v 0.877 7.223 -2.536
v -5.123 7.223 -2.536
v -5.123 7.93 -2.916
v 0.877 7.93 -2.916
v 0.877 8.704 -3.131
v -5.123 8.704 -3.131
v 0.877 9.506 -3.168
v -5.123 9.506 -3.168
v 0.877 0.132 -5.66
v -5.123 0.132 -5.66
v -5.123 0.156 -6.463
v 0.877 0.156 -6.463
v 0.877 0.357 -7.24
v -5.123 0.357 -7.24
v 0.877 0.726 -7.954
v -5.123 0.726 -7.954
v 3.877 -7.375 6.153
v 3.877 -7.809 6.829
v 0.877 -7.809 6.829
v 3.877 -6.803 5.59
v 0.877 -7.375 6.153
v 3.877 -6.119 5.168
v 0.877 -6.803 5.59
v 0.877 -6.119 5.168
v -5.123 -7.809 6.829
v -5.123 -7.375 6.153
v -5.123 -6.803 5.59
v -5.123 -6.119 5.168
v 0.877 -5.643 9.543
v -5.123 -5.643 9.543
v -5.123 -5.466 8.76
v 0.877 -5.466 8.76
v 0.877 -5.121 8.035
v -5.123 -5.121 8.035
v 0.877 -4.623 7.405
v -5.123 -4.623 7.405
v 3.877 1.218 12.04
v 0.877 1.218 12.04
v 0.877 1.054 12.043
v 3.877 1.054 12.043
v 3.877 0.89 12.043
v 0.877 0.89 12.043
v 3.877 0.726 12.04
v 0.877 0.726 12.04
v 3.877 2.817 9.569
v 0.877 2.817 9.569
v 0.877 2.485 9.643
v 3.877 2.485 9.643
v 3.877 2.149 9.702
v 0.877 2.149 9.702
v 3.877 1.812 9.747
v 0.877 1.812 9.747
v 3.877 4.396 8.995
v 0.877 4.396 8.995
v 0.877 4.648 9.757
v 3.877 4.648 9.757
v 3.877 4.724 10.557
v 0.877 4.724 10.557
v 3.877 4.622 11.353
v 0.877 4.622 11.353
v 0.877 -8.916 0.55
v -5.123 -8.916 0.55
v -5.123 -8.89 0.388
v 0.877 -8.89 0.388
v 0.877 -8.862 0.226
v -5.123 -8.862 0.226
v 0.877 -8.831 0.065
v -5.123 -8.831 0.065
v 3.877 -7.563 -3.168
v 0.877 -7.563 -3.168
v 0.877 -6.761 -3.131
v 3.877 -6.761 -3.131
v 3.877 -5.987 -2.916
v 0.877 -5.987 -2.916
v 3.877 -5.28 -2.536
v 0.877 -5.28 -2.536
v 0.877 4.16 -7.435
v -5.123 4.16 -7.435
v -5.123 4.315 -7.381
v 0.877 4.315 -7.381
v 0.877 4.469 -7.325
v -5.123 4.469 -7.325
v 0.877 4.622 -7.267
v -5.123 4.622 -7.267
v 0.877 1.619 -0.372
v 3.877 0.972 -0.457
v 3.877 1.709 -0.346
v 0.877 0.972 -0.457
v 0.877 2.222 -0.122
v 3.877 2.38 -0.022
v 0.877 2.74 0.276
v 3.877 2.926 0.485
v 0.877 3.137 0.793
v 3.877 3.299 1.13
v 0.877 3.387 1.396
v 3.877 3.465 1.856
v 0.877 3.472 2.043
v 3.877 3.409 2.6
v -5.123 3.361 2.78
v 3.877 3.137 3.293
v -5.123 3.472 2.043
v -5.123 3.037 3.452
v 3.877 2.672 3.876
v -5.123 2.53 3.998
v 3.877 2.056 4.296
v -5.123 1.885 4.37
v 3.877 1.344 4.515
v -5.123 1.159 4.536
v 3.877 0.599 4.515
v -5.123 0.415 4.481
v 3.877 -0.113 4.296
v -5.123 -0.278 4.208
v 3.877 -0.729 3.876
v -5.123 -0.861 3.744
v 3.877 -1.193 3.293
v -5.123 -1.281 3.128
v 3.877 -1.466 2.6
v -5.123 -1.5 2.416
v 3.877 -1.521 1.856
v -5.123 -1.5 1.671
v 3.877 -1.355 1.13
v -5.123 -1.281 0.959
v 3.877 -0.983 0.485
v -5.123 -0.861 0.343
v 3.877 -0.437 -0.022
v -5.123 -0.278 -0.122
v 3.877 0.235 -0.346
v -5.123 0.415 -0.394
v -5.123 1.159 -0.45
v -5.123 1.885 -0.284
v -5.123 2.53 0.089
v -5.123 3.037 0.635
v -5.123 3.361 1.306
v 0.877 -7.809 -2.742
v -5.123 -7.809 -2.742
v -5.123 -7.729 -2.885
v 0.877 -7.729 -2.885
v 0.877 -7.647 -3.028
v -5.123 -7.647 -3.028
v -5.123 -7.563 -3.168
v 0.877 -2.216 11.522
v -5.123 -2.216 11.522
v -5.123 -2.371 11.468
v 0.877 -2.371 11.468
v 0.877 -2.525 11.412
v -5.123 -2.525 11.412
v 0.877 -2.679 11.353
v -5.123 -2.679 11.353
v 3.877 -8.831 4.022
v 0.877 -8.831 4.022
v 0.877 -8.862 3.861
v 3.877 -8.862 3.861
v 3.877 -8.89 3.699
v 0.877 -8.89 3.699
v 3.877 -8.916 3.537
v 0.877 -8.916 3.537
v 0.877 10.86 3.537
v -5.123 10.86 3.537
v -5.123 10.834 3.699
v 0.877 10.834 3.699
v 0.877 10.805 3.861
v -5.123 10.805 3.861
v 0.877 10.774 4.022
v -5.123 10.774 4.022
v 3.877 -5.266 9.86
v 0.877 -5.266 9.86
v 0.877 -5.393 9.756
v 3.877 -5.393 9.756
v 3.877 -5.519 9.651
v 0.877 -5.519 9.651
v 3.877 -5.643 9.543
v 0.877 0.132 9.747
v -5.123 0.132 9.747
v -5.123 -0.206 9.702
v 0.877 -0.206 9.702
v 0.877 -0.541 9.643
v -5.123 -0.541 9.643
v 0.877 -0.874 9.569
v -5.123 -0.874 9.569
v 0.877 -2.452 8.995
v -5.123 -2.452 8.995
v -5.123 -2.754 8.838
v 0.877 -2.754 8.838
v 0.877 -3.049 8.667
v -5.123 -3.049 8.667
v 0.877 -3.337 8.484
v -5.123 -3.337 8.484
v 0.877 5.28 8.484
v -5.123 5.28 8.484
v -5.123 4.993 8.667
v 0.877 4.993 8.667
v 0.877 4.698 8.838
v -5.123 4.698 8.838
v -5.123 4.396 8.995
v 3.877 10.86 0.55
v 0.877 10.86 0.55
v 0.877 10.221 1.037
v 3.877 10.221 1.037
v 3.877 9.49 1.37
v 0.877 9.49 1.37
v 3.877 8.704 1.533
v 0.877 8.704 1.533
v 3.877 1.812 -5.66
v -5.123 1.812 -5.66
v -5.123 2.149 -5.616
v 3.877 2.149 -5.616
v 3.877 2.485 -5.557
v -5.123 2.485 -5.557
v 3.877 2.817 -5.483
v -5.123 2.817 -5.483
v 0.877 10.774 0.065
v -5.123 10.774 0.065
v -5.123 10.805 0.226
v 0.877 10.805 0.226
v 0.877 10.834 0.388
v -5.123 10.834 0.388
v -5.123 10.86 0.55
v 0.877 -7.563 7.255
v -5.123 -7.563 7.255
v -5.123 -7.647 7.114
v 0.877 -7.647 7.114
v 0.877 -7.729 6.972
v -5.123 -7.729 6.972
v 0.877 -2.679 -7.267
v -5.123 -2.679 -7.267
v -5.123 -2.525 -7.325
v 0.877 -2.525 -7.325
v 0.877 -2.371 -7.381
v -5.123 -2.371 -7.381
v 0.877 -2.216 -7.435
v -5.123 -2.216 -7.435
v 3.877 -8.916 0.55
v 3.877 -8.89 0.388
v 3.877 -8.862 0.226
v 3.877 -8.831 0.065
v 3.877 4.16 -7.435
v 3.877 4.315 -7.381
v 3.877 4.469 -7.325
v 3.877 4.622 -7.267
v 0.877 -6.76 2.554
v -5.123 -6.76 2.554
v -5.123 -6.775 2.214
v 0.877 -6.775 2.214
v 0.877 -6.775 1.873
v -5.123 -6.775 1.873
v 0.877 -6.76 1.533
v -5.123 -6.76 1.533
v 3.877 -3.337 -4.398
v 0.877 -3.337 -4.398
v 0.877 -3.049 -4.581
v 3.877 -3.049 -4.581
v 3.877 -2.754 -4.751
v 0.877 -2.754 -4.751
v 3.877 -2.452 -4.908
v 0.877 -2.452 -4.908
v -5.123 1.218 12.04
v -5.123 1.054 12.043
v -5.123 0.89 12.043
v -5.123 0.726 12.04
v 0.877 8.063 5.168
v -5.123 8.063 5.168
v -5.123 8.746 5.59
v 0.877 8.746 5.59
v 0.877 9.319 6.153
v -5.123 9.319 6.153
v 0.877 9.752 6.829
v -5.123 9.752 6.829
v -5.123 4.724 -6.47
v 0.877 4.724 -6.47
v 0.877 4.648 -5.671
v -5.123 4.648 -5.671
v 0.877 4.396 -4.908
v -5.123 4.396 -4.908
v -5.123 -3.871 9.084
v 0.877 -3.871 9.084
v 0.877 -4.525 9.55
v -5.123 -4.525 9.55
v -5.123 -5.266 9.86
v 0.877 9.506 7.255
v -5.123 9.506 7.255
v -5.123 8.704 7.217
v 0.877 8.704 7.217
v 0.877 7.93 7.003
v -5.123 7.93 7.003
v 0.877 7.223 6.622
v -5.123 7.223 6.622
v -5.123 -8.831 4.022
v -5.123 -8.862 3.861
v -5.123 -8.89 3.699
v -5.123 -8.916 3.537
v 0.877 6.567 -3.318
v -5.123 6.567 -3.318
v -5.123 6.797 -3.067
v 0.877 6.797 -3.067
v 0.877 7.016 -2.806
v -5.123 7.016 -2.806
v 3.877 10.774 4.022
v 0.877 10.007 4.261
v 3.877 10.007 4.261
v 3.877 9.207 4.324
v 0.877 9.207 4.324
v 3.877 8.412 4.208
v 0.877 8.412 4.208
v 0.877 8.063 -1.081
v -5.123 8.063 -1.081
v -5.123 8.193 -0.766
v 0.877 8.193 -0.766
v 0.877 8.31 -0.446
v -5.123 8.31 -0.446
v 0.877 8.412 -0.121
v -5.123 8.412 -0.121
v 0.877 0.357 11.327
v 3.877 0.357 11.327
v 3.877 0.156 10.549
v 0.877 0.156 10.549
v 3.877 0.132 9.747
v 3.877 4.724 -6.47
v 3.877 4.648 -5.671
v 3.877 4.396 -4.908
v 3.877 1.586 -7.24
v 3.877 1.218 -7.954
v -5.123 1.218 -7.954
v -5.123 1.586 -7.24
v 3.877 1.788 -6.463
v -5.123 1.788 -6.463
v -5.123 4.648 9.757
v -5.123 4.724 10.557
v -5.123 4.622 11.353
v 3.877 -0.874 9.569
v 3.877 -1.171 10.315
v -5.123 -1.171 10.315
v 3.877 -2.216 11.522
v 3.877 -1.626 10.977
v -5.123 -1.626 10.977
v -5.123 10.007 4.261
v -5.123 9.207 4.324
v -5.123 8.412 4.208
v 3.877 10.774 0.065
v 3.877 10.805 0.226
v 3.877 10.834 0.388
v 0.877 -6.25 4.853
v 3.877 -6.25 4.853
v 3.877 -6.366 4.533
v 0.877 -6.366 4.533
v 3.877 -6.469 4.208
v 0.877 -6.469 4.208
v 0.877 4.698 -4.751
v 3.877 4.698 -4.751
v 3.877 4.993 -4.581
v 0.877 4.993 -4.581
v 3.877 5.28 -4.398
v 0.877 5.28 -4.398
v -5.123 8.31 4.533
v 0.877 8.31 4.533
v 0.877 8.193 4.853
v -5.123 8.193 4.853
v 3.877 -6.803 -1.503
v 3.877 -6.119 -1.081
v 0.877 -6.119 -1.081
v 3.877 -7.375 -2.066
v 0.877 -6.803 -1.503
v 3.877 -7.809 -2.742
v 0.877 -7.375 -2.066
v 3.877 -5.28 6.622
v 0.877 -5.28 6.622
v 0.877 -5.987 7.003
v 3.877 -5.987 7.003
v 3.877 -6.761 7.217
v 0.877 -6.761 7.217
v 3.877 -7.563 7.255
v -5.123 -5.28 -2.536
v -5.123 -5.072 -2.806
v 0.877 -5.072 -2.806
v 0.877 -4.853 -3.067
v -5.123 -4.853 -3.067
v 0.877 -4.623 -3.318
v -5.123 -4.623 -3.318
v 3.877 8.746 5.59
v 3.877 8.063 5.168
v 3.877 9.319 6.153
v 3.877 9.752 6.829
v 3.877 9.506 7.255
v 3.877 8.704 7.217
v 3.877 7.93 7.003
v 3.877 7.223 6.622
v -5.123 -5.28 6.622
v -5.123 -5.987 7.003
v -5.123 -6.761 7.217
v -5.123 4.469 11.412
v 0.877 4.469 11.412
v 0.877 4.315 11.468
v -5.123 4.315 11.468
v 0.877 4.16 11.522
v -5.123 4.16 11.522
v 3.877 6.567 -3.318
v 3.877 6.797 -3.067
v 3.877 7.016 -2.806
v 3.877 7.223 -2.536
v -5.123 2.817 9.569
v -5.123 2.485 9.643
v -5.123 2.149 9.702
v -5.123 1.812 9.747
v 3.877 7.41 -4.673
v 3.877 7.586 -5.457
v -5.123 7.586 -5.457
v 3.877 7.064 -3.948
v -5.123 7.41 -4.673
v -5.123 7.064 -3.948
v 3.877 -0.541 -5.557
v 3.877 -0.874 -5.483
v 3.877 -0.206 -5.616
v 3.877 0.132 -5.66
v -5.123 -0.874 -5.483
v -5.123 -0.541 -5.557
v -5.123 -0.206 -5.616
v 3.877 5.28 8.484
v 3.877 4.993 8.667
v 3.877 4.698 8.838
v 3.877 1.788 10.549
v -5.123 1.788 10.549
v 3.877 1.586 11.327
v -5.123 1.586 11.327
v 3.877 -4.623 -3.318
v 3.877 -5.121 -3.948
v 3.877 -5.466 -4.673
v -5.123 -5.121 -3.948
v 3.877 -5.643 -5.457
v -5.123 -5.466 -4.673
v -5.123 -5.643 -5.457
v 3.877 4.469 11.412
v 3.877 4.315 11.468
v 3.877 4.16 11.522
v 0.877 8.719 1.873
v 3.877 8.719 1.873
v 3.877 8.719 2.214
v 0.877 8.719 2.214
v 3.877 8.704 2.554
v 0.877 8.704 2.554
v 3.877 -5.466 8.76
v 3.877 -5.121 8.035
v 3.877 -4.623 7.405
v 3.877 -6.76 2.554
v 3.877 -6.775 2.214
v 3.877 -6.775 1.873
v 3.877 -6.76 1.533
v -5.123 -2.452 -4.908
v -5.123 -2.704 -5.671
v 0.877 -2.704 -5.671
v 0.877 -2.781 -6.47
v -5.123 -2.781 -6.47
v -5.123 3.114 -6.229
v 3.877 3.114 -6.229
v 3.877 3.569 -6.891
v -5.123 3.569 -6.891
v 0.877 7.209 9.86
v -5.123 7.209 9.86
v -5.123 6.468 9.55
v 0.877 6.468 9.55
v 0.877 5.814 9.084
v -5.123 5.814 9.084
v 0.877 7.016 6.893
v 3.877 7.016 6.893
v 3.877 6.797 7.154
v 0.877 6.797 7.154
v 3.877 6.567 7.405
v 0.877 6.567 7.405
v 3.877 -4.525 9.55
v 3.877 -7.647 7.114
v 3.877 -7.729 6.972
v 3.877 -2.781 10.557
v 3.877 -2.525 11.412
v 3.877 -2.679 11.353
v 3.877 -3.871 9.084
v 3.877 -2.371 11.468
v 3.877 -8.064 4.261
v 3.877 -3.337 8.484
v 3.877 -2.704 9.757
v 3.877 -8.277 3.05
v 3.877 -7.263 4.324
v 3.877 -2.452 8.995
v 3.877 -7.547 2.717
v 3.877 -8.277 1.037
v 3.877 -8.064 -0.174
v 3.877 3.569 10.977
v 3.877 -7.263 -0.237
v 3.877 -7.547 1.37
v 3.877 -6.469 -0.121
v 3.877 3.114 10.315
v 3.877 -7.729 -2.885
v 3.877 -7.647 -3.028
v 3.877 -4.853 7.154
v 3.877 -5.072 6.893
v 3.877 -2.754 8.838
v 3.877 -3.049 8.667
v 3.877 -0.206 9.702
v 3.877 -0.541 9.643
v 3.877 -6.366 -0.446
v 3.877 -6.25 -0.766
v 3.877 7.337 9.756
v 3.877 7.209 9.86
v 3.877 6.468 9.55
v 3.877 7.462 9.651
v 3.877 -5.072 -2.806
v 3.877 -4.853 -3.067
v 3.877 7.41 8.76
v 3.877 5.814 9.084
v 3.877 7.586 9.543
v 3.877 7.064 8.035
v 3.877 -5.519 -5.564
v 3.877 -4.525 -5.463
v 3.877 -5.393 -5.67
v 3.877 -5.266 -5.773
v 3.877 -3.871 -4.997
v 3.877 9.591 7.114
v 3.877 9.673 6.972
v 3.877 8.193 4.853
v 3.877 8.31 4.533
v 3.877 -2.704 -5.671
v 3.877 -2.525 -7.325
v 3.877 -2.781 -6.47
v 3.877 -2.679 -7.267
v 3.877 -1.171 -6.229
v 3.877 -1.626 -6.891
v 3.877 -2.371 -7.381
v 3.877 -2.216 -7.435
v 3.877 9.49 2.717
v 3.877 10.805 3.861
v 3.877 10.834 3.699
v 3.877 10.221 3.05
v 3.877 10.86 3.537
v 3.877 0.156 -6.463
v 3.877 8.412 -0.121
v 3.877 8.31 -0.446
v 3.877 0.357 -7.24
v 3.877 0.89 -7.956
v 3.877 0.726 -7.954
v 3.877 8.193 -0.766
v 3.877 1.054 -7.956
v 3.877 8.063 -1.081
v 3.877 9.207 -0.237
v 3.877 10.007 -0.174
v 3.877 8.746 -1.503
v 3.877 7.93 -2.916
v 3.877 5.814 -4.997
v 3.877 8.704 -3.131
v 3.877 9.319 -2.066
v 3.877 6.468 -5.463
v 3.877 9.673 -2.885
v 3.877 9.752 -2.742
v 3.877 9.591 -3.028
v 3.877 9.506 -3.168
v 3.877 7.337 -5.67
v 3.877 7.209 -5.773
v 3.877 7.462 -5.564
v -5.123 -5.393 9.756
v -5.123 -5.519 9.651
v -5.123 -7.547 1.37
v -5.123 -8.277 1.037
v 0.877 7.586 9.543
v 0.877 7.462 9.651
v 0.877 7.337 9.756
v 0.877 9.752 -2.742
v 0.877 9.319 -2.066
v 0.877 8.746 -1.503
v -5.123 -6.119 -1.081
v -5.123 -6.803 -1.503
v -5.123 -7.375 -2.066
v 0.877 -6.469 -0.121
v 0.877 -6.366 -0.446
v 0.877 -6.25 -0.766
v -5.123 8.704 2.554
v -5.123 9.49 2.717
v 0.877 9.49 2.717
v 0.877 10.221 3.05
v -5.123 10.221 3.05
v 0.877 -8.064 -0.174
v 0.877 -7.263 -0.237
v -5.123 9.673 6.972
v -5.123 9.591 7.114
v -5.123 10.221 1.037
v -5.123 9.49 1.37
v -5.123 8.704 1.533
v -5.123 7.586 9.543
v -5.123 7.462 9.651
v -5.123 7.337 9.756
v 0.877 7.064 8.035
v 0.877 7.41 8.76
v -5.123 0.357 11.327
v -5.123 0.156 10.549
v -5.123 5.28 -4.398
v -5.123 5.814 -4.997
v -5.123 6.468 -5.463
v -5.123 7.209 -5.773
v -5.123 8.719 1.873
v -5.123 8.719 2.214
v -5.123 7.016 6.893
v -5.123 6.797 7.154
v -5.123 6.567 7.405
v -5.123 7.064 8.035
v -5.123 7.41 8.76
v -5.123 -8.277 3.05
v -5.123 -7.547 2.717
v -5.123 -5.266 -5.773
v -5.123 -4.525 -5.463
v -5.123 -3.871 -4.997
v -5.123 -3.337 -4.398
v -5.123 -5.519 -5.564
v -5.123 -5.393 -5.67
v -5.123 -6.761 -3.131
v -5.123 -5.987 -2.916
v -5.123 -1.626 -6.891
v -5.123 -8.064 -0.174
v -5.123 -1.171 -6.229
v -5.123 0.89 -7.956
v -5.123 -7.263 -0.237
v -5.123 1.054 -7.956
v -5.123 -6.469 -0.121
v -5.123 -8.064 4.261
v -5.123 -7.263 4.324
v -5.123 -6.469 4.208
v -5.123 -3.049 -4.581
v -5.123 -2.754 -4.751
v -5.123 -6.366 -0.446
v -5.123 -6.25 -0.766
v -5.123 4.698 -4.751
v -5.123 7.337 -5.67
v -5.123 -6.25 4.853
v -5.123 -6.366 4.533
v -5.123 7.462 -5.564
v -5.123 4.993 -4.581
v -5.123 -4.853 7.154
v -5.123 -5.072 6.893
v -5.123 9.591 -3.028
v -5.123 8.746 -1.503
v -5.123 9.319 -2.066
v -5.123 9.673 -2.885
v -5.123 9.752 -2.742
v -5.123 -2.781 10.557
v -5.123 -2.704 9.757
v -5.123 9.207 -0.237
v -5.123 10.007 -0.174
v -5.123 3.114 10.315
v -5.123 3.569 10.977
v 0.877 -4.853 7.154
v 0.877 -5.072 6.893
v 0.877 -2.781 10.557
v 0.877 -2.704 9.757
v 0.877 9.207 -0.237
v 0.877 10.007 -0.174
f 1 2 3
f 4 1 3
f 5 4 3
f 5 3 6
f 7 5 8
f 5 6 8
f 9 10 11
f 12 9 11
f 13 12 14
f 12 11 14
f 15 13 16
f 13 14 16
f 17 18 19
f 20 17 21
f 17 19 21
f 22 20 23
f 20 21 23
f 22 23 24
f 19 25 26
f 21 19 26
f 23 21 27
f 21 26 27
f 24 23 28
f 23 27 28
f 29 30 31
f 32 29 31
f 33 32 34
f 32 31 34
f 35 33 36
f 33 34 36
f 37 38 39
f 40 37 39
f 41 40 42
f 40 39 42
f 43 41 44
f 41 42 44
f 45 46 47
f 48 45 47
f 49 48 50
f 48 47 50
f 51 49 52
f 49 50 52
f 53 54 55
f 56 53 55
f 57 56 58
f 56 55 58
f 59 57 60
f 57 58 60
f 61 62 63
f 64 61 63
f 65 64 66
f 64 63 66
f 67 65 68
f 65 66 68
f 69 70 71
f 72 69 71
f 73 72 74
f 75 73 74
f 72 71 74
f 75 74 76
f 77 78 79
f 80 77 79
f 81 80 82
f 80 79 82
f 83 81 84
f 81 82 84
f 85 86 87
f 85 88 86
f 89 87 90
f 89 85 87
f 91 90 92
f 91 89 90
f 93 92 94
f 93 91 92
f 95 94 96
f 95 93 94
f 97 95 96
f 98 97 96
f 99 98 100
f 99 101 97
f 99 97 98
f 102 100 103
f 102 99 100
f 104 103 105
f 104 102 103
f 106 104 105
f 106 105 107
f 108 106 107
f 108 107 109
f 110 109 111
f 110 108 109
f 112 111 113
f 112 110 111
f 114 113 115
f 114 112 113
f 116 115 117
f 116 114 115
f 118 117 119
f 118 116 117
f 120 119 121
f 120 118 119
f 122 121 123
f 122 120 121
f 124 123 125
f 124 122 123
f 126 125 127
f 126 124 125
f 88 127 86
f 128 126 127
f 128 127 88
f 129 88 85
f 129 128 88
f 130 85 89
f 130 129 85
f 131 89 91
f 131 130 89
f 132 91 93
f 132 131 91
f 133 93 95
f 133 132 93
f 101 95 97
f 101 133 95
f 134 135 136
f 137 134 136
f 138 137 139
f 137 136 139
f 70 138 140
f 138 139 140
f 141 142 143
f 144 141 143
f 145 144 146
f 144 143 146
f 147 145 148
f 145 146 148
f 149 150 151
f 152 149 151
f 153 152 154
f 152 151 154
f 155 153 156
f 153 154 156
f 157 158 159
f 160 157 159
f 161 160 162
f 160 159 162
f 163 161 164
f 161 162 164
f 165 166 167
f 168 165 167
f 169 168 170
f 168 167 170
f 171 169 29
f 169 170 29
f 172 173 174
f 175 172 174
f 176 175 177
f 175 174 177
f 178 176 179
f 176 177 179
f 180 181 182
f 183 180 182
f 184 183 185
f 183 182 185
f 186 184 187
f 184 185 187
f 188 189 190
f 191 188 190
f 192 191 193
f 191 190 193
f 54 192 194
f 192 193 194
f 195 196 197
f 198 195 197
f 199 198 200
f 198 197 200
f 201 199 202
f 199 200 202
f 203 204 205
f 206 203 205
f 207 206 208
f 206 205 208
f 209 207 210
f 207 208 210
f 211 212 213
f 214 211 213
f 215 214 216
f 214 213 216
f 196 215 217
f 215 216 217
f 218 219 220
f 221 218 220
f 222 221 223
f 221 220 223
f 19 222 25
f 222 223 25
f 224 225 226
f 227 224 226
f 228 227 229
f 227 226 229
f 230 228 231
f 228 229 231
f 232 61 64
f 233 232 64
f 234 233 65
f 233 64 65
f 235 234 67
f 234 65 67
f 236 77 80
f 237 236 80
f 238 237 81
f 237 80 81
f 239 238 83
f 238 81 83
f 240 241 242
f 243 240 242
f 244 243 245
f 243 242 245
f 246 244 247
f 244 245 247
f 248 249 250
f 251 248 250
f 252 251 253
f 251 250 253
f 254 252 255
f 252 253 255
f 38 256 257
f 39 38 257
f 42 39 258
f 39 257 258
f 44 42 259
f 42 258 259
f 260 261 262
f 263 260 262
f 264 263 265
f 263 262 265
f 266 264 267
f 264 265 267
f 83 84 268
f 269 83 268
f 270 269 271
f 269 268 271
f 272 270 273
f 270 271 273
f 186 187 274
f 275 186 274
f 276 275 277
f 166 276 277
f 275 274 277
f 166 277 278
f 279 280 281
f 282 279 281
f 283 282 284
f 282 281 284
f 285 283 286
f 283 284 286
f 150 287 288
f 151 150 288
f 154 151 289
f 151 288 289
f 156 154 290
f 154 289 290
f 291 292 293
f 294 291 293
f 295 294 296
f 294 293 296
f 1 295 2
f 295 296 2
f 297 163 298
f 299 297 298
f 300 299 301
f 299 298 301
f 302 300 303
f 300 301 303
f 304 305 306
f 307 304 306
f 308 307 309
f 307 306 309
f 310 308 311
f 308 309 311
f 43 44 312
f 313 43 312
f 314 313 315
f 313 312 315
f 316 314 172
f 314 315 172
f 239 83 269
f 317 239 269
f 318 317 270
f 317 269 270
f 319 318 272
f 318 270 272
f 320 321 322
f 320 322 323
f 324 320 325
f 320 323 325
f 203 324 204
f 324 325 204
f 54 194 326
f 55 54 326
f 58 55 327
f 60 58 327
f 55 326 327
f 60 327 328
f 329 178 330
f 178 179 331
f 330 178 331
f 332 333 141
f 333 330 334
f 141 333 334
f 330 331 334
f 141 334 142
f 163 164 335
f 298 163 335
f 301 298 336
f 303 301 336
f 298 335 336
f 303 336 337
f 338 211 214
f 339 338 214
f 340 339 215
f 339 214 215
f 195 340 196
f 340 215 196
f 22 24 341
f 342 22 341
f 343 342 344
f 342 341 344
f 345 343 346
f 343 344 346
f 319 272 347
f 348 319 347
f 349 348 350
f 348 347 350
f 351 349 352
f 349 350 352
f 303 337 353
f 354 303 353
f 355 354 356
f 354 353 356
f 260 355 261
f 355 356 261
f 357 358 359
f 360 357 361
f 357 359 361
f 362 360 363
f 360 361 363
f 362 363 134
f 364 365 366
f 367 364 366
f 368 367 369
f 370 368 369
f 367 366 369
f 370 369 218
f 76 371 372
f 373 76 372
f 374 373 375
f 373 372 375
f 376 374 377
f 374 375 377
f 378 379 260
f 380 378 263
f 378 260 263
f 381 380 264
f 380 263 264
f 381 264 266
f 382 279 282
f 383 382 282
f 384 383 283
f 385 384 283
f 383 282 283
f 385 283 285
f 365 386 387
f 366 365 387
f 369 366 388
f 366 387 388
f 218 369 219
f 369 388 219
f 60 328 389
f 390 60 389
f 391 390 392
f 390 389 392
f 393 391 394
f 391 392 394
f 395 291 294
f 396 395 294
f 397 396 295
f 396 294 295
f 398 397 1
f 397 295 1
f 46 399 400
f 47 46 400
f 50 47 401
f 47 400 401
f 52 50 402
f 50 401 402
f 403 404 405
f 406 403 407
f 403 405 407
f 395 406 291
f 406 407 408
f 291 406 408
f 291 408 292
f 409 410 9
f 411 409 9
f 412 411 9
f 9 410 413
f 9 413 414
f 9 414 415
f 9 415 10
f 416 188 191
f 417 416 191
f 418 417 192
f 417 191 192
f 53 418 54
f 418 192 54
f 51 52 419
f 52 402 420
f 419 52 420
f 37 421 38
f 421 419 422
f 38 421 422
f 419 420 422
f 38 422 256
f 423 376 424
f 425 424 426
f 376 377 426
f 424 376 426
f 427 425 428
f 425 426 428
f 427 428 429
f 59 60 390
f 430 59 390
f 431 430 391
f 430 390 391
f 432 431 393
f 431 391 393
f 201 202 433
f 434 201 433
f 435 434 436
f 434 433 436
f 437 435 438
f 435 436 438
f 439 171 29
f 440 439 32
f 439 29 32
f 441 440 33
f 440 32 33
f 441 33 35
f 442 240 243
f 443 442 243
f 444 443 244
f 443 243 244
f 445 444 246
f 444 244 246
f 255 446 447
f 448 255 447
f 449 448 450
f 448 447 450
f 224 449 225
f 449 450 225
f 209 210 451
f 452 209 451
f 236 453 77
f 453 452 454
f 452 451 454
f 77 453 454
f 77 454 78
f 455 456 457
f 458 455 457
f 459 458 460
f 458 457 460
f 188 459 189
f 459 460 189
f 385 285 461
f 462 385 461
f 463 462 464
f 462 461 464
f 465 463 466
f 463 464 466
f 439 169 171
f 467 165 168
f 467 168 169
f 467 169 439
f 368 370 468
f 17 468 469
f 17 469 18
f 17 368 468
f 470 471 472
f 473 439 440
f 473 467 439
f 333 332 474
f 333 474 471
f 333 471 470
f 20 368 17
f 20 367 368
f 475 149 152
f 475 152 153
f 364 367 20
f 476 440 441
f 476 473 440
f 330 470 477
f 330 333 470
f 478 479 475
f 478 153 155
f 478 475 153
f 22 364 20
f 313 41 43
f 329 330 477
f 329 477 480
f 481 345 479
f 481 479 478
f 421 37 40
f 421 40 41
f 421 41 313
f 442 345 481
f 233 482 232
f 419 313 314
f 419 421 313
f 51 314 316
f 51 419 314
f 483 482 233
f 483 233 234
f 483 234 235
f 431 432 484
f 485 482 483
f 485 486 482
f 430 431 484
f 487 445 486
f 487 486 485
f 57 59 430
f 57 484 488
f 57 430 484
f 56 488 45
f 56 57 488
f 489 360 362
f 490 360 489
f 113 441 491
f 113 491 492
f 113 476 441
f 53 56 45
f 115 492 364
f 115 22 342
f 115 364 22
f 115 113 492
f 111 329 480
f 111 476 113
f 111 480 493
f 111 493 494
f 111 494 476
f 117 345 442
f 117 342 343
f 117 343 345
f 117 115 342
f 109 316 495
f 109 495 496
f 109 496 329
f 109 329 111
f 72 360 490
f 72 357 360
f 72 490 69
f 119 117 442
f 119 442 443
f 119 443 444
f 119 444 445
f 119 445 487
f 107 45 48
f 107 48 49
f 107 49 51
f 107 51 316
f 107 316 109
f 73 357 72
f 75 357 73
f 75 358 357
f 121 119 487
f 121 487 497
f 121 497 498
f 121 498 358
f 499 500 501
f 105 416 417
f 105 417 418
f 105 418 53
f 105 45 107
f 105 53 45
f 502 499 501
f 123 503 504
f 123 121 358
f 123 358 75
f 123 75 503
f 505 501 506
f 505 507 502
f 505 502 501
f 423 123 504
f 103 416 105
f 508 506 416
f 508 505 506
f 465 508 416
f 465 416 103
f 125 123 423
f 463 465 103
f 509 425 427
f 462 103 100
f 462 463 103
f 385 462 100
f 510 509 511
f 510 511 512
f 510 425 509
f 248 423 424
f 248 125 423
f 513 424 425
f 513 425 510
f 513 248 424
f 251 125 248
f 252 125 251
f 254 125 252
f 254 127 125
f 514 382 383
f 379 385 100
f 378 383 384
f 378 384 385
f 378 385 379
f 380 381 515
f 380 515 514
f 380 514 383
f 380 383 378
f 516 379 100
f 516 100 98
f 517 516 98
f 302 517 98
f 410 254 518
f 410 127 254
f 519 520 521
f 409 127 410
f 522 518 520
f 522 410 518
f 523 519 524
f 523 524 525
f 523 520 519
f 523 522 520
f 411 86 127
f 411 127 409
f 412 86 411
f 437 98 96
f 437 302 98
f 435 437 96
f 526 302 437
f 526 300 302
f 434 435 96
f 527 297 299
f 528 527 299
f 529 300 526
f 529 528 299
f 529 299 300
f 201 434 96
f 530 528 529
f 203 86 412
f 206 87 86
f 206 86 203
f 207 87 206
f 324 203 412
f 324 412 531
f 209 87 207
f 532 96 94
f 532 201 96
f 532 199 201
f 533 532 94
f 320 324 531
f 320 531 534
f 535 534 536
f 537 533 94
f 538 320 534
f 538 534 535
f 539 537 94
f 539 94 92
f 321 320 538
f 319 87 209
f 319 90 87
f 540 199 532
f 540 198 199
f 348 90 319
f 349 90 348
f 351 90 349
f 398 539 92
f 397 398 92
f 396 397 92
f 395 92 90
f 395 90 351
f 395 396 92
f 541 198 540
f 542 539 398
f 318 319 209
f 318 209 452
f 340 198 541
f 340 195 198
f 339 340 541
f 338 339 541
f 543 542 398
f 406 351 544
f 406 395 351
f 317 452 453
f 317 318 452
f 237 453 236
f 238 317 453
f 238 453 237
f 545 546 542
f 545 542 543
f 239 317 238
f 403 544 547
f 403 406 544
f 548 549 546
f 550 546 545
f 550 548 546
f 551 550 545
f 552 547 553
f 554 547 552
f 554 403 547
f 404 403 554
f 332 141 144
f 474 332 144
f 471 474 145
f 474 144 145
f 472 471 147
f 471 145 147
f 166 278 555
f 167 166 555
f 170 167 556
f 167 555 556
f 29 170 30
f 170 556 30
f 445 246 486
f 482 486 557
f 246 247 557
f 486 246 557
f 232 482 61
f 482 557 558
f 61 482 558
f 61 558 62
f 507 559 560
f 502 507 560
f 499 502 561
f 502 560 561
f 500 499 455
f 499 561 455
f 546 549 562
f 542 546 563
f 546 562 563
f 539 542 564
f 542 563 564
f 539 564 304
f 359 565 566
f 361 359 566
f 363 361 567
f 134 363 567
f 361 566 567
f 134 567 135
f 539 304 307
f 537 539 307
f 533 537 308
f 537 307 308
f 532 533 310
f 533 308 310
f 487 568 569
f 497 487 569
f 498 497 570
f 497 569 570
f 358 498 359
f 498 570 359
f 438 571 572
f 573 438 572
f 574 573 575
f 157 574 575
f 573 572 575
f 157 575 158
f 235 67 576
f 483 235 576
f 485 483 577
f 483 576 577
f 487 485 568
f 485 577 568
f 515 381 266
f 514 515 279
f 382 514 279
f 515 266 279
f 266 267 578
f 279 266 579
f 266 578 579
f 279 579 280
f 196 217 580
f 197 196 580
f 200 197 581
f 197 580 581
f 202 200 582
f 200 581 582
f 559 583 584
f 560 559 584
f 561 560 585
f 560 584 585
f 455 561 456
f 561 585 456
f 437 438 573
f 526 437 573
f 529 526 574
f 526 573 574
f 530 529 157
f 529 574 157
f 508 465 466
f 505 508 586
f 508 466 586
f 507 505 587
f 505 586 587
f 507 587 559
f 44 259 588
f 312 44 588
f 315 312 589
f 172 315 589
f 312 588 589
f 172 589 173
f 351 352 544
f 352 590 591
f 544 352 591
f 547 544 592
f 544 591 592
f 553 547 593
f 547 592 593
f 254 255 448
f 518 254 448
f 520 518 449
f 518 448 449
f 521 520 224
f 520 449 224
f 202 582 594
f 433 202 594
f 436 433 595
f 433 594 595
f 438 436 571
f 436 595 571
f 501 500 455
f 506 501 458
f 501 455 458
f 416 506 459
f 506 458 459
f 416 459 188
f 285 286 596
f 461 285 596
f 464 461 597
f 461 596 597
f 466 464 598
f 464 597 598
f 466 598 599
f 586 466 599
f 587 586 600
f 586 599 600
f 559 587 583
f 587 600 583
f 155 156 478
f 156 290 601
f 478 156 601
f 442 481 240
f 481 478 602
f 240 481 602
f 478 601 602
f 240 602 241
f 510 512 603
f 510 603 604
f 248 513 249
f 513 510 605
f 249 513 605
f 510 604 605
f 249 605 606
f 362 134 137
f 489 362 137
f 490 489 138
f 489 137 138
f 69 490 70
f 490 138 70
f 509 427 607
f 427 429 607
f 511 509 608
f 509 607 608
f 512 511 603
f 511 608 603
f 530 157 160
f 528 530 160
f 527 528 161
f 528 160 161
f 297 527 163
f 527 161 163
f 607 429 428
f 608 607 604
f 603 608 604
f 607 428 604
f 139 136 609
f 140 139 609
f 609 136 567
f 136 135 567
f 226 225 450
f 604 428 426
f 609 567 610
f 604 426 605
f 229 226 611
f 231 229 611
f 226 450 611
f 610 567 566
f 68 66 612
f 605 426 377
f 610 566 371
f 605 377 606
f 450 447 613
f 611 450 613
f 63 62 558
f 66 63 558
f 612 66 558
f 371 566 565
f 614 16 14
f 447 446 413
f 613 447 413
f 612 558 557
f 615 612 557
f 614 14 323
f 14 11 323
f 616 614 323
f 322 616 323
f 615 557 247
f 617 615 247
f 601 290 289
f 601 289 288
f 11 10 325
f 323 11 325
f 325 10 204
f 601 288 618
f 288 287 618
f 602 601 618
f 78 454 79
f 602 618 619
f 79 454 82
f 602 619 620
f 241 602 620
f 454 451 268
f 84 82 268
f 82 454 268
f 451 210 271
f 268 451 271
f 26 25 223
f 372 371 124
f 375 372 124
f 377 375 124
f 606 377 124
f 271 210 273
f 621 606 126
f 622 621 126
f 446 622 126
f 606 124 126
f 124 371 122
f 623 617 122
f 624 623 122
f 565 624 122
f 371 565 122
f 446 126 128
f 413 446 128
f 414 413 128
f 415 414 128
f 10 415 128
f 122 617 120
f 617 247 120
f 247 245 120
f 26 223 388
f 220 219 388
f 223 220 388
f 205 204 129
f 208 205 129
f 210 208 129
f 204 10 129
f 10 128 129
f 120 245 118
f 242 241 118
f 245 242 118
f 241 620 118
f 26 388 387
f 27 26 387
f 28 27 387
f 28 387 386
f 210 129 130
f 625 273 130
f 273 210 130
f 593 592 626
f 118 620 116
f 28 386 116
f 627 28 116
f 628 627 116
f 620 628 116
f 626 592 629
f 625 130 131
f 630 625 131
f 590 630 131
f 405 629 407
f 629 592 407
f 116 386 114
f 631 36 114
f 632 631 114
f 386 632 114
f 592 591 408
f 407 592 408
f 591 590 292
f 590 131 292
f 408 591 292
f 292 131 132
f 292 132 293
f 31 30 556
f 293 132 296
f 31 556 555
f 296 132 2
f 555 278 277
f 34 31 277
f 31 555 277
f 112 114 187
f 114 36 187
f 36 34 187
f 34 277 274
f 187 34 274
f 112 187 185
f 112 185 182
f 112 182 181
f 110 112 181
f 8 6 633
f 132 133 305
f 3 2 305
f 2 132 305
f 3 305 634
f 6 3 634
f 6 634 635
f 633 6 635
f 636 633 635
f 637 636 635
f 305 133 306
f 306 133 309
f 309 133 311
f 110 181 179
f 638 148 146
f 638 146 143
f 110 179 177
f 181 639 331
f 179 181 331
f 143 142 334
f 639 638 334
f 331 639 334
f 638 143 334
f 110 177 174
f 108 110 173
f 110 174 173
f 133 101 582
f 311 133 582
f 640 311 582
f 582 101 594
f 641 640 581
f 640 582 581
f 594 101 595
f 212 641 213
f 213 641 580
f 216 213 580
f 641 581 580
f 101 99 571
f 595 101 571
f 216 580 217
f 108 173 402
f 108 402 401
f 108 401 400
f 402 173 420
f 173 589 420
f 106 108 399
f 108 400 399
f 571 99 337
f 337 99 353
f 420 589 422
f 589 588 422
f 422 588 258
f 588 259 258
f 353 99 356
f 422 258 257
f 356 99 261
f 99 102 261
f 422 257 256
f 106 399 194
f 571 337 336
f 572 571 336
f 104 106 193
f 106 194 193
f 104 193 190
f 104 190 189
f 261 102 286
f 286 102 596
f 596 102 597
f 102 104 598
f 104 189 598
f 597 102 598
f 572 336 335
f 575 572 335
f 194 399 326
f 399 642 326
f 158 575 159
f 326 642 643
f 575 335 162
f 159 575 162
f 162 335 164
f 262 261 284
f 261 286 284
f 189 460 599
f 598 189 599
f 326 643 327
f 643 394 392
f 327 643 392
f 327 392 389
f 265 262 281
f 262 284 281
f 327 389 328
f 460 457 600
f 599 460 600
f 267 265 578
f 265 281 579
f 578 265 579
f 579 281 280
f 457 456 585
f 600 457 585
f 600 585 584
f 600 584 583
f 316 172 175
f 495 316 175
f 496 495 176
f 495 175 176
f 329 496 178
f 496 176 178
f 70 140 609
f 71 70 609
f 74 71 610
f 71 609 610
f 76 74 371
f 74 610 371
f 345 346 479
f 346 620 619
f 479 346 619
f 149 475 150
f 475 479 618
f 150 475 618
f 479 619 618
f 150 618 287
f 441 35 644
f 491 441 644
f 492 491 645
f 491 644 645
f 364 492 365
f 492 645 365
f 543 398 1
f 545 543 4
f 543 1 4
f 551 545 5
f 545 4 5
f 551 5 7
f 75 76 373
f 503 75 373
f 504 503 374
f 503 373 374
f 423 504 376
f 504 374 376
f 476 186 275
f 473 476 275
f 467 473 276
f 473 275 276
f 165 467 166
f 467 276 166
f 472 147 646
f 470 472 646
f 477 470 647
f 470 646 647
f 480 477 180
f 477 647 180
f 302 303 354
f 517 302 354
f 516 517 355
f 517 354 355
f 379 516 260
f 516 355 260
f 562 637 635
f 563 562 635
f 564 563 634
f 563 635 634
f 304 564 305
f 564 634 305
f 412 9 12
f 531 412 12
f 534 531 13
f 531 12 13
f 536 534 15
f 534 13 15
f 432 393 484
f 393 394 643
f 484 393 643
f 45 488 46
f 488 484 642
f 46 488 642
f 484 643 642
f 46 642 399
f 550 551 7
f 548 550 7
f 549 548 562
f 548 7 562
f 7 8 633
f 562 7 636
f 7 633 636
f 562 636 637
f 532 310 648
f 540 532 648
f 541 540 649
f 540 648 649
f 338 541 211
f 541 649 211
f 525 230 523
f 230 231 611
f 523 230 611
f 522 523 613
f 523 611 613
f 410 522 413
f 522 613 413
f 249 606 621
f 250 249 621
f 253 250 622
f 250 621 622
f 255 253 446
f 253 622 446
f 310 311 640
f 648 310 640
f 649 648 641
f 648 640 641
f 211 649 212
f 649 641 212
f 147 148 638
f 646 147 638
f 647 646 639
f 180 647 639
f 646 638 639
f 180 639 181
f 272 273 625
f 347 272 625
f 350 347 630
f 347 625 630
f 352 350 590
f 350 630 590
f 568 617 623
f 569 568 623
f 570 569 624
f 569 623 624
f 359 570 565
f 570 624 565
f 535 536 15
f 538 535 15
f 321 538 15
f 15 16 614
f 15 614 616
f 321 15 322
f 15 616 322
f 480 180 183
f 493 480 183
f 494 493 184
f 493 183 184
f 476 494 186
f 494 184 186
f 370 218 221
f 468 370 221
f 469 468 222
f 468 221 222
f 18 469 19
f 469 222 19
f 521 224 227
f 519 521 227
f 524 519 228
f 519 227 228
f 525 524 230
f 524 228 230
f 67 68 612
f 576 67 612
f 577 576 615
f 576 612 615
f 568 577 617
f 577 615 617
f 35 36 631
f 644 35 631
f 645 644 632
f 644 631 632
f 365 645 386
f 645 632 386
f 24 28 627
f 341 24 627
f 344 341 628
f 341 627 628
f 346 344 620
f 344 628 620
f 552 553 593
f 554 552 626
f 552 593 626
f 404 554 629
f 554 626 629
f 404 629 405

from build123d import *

# Parameters (mm, degrees)
SPUR_START             = -5.123248026
SPUR_GEAR_AM_OUTLINE_R = 2.5
SPUR_GEAR_AM_DEPTH     = 6
SKETCH9_R              = 2.5
BOSS_EXTRUDE1_DEPTH    = 3


# Read off the part's stored shape, not the designer's step: spur gear_am
with BuildPart() as part:
    # spur gear_am outline → spur gear_am (new body)
    with BuildSketch(Plane.YZ.offset(SPUR_START)):
        with BuildLine():
            ThreePointArc((7.586194163, 9.54321535), (7.39961576, 9.703727004), (7.209143639, 9.859598305))
            ThreePointArc((7.209143639, 9.859598305), (6.128209094, 9.33514268), (5.280046523, 8.484205876))
            ThreePointArc((5.280046523, 8.484205876), (4.846239663, 8.754113426), (4.395589438, 8.994847412))
            ThreePointArc((4.395589438, 8.994847412), (4.708441041, 10.154846148), (4.622165664, 11.353190736))
            ThreePointArc((4.622165664, 11.353190736), (4.391941096, 11.44020878), (4.159644725, 11.52153459))
            ThreePointArc((4.159644725, 11.52153459), (3.323272898, 10.659006121), (2.817298316, 9.569298401))
            ThreePointArc((2.817298316, 9.569298401), (2.317339392, 9.67455785), (1.811530828, 9.746642346))
            ThreePointArc((1.811530828, 9.746642346), (1.708772237, 10.943686148), (1.217841914, 12.040253798))
            ThreePointArc((1.217841914, 12.040253798), (0.971739663, 12.043282572), (0.725637412, 12.040253798))
            ThreePointArc((0.725637412, 12.040253798), (0.234707088, 10.943686148), (0.131948498, 9.746642346))
            ThreePointArc((0.131948498, 9.746642346), (-0.373860066, 9.67455785), (-0.87381899, 9.569298401))
            ThreePointArc((-0.87381899, 9.569298401), (-1.379793572, 10.659006121), (-2.216165399, 11.52153459))
            ThreePointArc((-2.216165399, 11.52153459), (-2.44846177, 11.44020878), (-2.678686338, 11.353190736))
            ThreePointArc((-2.678686338, 11.353190736), (-2.764961716, 10.154846148), (-2.452110112, 8.994847412))
            ThreePointArc((-2.452110112, 8.994847412), (-2.902760337, 8.754113426), (-3.336567197, 8.484205876))
            ThreePointArc((-3.336567197, 8.484205876), (-4.184729769, 9.33514268), (-5.265664313, 9.859598305))
            ThreePointArc((-5.265664313, 9.859598305), (-5.456136434, 9.703727004), (-5.642714837, 9.54321535))
            ThreePointArc((-5.642714837, 9.54321535), (-5.313929185, 8.387631866), (-4.623201908, 7.404591164))
            ThreePointArc((-4.623201908, 7.404591164), (-4.964338727, 7.02424376), (-5.279670013, 6.622242942))
            ThreePointArc((-5.279670013, 6.622242942), (-6.367719651, 7.131773293), (-7.562840254, 7.254898987))
            ThreePointArc((-7.562840254, 7.254898987), (-7.688514375, 7.043282572), (-7.808942505, 6.828637384))
            ThreePointArc((-7.808942505, 6.828637384), (-7.104752225, 5.855195427), (-6.119461178, 5.167681976))
            ThreePointArc((-6.119461178, 5.167681976), (-6.309938456, 4.693596663), (-6.468760561, 4.207989809))
            ThreePointArc((-6.468760561, 4.207989809), (-7.66546242, 4.314656828), (-8.830619899, 4.021601813))
            ThreePointArc((-8.830619899, 4.021601813), (-8.876337867, 3.779764349), (-8.916090314, 3.536875003))
            ThreePointArc((-8.916090314, 3.536875003), (-7.921431147, 2.86298604), (-6.760416972, 2.553924109))
            ThreePointArc((-6.760416972, 2.553924109), (-6.777260337, 2.043282572), (-6.760416972, 1.532641036))
            ThreePointArc((-6.760416972, 1.532641036), (-7.921431147, 1.223579105), (-8.916090314, 0.549690142))
            ThreePointArc((-8.916090314, 0.549690142), (-8.876337867, 0.306800796), (-8.830619899, 0.064963332))
            ThreePointArc((-8.830619899, 0.064963332), (-7.66546242, -0.228091683), (-6.468760561, -0.121424665))
            ThreePointArc((-6.468760561, -0.121424665), (-6.309938456, -0.607031518), (-6.119461178, -1.081116831))
            ThreePointArc((-6.119461178, -1.081116831), (-7.104752225, -1.768630282), (-7.808942505, -2.742072239))
            ThreePointArc((-7.808942505, -2.742072239), (-7.688514375, -2.956717428), (-7.562840254, -3.168333842))
            ThreePointArc((-7.562840254, -3.168333842), (-6.36771965, -3.045208149), (-5.279670013, -2.535677797))
            ThreePointArc((-5.279670013, -2.535677797), (-4.964338727, -2.937678615), (-4.623201908, -3.31802602))
            ThreePointArc((-4.623201908, -3.31802602), (-5.313929185, -4.301066721), (-5.642714837, -5.456650205))
            ThreePointArc((-5.642714837, -5.456650205), (-5.456136434, -5.617161859), (-5.265664313, -5.773033161))
            ThreePointArc((-5.265664313, -5.773033161), (-4.184729769, -5.248577535), (-3.336567197, -4.397640731))
            ThreePointArc((-3.336567197, -4.397640731), (-2.902760337, -4.667548282), (-2.452110112, -4.908282267))
            ThreePointArc((-2.452110112, -4.908282267), (-2.764961716, -6.068281003), (-2.678686338, -7.266625591))
            ThreePointArc((-2.678686338, -7.266625591), (-2.44846177, -7.353643635), (-2.216165399, -7.434969446))
            ThreePointArc((-2.216165399, -7.434969446), (-1.379793572, -6.572440977), (-0.87381899, -5.482733257))
            ThreePointArc((-0.87381899, -5.482733257), (-0.373860066, -5.587992706), (0.131948498, -5.660077201))
            ThreePointArc((0.131948498, -5.660077201), (0.234707088, -6.857121003), (0.725637412, -7.953688653))
            ThreePointArc((0.725637412, -7.953688653), (0.971739663, -7.956717428), (1.217841914, -7.953688653))
            ThreePointArc((1.217841914, -7.953688653), (1.708772237, -6.857121003), (1.811530828, -5.660077201))
            ThreePointArc((1.811530828, -5.660077201), (2.317339392, -5.587992706), (2.817298316, -5.482733257))
            ThreePointArc((2.817298316, -5.482733257), (3.323272898, -6.572440977), (4.159644725, -7.434969446))
            ThreePointArc((4.159644725, -7.434969446), (4.391941096, -7.353643635), (4.622165664, -7.266625591))
            ThreePointArc((4.622165664, -7.266625591), (4.708441041, -6.068281003), (4.395589438, -4.908282267))
            ThreePointArc((4.395589438, -4.908282267), (4.846239663, -4.667548282), (5.280046523, -4.397640731))
            ThreePointArc((5.280046523, -4.397640731), (6.128209095, -5.248577535), (7.209143639, -5.773033161))
            ThreePointArc((7.209143639, -5.773033161), (7.39961576, -5.617161859), (7.586194163, -5.456650205))
            ThreePointArc((7.586194163, -5.456650205), (7.257408511, -4.301066721), (6.566681234, -3.31802602))
            ThreePointArc((6.566681234, -3.31802602), (6.907818053, -2.937678615), (7.223149338, -2.535677797))
            ThreePointArc((7.223149338, -2.535677797), (8.311198976, -3.045208149), (9.506319579, -3.168333842))
            ThreePointArc((9.506319579, -3.168333842), (9.631993701, -2.956717428), (9.752421831, -2.742072239))
            ThreePointArc((9.752421831, -2.742072239), (9.048231551, -1.768630282), (8.062940504, -1.081116831))
            ThreePointArc((8.062940504, -1.081116831), (8.253417781, -0.607031518), (8.412239886, -0.121424665))
            ThreePointArc((8.412239886, -0.121424665), (9.608941746, -0.228091683), (10.774099225, 0.064963332))
            ThreePointArc((10.774099225, 0.064963332), (10.819817193, 0.306800796), (10.85956964, 0.549690142))
            ThreePointArc((10.85956964, 0.549690142), (9.864910473, 1.223579105), (8.703896297, 1.532641036))
            ThreePointArc((8.703896297, 1.532641036), (8.720739663, 2.043282572), (8.703896297, 2.553924109))
            ThreePointArc((8.703896297, 2.553924109), (9.864910473, 2.86298604), (10.85956964, 3.536875003))
            ThreePointArc((10.85956964, 3.536875003), (10.819817193, 3.779764349), (10.774099225, 4.021601813))
            ThreePointArc((10.774099225, 4.021601813), (9.608941746, 4.314656828), (8.412239886, 4.207989809))
            ThreePointArc((8.412239886, 4.207989809), (8.253417781, 4.693596663), (8.062940504, 5.167681976))
            ThreePointArc((8.062940504, 5.167681976), (9.048231551, 5.855195427), (9.752421831, 6.828637384))
            ThreePointArc((9.752421831, 6.828637384), (9.631993701, 7.043282573), (9.506319579, 7.254898987))
            ThreePointArc((9.506319579, 7.254898987), (8.311198976, 7.131773293), (7.223149338, 6.622242942))
            ThreePointArc((7.223149338, 6.622242942), (6.907818053, 7.02424376), (6.566681234, 7.404591164))
            ThreePointArc((6.566681234, 7.404591164), (7.257408511, 8.387631866), (7.586194163, 9.54321535))
        make_face()
        with Locations((0.971739663, 2.043282572)):
            Circle(SPUR_GEAR_AM_OUTLINE_R, mode=Mode.SUBTRACT)
    extrude(amount=SPUR_GEAR_AM_DEPTH)

    # Sketch9 → Boss-Extrude1 (add)
    with BuildSketch(Plane(origin=(0.876751974, 0.971739663, 2.043282572), x_dir=(0, 0, -1), z_dir=(1, 0, 0))):
        with BuildLine():
            ThreePointArc((-7.816315733, 6.237403976), (-7.291860108, 5.156469432), (-6.440923303, 4.30830686))
            ThreePointArc((-6.440923303, 4.30830686), (-6.710830854, 3.8745), (-6.95156484, 3.423849775))
            ThreePointArc((-6.95156484, 3.423849775), (-8.111563575, 3.736701378), (-9.309908163, 3.650426001))
            ThreePointArc((-9.309908163, 3.650426001), (-9.396926208, 3.420201433), (-9.478252018, 3.187905062))
            ThreePointArc((-9.478252018, 3.187905062), (-8.615723549, 2.351533235), (-7.526015829, 1.845558653))
            ThreePointArc((-7.526015829, 1.845558653), (-7.631275278, 1.345599729), (-7.703359773, 0.839791165))
            ThreePointArc((-7.703359773, 0.839791165), (-8.900403576, 0.737032575), (-9.996971225, 0.246102251))
            ThreePointArc((-9.996971225, 0.246102251), (-10, 0), (-9.996971225, -0.246102251))
            ThreePointArc((-9.996971225, -0.246102251), (-8.900403576, -0.737032575), (-7.703359773, -0.839791165))
            ThreePointArc((-7.703359773, -0.839791165), (-7.631275278, -1.345599729), (-7.526015829, -1.845558653))
            ThreePointArc((-7.526015829, -1.845558653), (-8.615723549, -2.351533235), (-9.478252018, -3.187905062))
            ThreePointArc((-9.478252018, -3.187905062), (-9.396926208, -3.420201433), (-9.309908163, -3.650426001))
            ThreePointArc((-9.309908163, -3.650426001), (-8.111563575, -3.736701378), (-6.95156484, -3.423849775))
            ThreePointArc((-6.95156484, -3.423849775), (-6.710830854, -3.8745), (-6.440923303, -4.30830686))
            ThreePointArc((-6.440923303, -4.30830686), (-7.291860108, -5.156469432), (-7.816315733, -6.237403976))
            ThreePointArc((-7.816315733, -6.237403976), (-7.660444431, -6.427876097), (-7.499932777, -6.6144545))
            ThreePointArc((-7.499932777, -6.6144545), (-6.344349294, -6.285668848), (-5.361308592, -5.594941571))
            ThreePointArc((-5.361308592, -5.594941571), (-4.980961187, -5.93607839), (-4.57896037, -6.251409676))
            ThreePointArc((-4.57896037, -6.251409676), (-5.088490721, -7.339459313), (-5.211616414, -8.534579916))
            ThreePointArc((-5.211616414, -8.534579916), (-5, -8.660254038), (-4.785354811, -8.780682168))
            ThreePointArc((-4.785354811, -8.780682168), (-3.811912855, -8.076491888), (-3.124399404, -7.091200841))
            ThreePointArc((-3.124399404, -7.091200841), (-2.650314091, -7.281678118), (-2.164707237, -7.440500224))
            ThreePointArc((-2.164707237, -7.440500224), (-2.271374255, -8.637202083), (-1.978319241, -9.802359562))
            ThreePointArc((-1.978319241, -9.802359562), (-1.736481777, -9.84807753), (-1.49359243, -9.887829977))
            ThreePointArc((-1.49359243, -9.887829977), (-0.819703468, -8.89317081), (-0.510641536, -7.732156635))
            ThreePointArc((-0.510641536, -7.732156635), (0, -7.749), (0.510641536, -7.732156635))
            ThreePointArc((0.510641536, -7.732156635), (0.819703468, -8.89317081), (1.49359243, -9.887829977))
            ThreePointArc((1.49359243, -9.887829977), (1.736481777, -9.84807753), (1.978319241, -9.802359562))
            ThreePointArc((1.978319241, -9.802359562), (2.271374255, -8.637202083), (2.164707237, -7.440500224))
            ThreePointArc((2.164707237, -7.440500224), (2.650314091, -7.281678118), (3.124399404, -7.091200841))
            ThreePointArc((3.124399404, -7.091200841), (3.811912855, -8.076491888), (4.785354811, -8.780682168))
            ThreePointArc((4.785354811, -8.780682168), (5, -8.660254038), (5.211616414, -8.534579916))
            ThreePointArc((5.211616414, -8.534579916), (5.088490721, -7.339459313), (4.57896037, -6.251409676))
            ThreePointArc((4.57896037, -6.251409676), (4.980961187, -5.93607839), (5.361308592, -5.594941571))
            ThreePointArc((5.361308592, -5.594941571), (6.344349294, -6.285668848), (7.499932777, -6.6144545))
            ThreePointArc((7.499932777, -6.6144545), (7.660444431, -6.427876097), (7.816315733, -6.237403976))
            ThreePointArc((7.816315733, -6.237403976), (7.291860108, -5.156469432), (6.440923303, -4.30830686))
            ThreePointArc((6.440923303, -4.30830686), (6.710830854, -3.8745), (6.95156484, -3.423849775))
            ThreePointArc((6.95156484, -3.423849775), (8.111563575, -3.736701378), (9.309908163, -3.650426001))
            ThreePointArc((9.309908163, -3.650426001), (9.396926208, -3.420201433), (9.478252018, -3.187905062))
            ThreePointArc((9.478252018, -3.187905062), (8.615723549, -2.351533235), (7.526015829, -1.845558653))
            ThreePointArc((7.526015829, -1.845558653), (7.631275278, -1.345599729), (7.703359773, -0.839791165))
            ThreePointArc((7.703359773, -0.839791165), (8.900403576, -0.737032575), (9.996971225, -0.246102251))
            ThreePointArc((9.996971225, -0.246102251), (10, 0), (9.996971225, 0.246102251))
            ThreePointArc((9.996971225, 0.246102251), (8.900403576, 0.737032575), (7.703359773, 0.839791165))
            ThreePointArc((7.703359773, 0.839791165), (7.631275278, 1.345599729), (7.526015829, 1.845558653))
            ThreePointArc((7.526015829, 1.845558653), (8.615723549, 2.351533235), (9.478252018, 3.187905062))
            ThreePointArc((9.478252018, 3.187905062), (9.396926208, 3.420201433), (9.309908163, 3.650426001))
            ThreePointArc((9.309908163, 3.650426001), (8.111563575, 3.736701378), (6.95156484, 3.423849775))
            ThreePointArc((6.95156484, 3.423849775), (6.710830854, 3.8745), (6.440923303, 4.30830686))
            ThreePointArc((6.440923303, 4.30830686), (7.291860108, 5.156469432), (7.816315733, 6.237403976))
            ThreePointArc((7.816315733, 6.237403976), (7.660444431, 6.427876097), (7.499932777, 6.6144545))
            ThreePointArc((7.499932777, 6.6144545), (6.344349294, 6.285668848), (5.361308592, 5.594941571))
            ThreePointArc((5.361308592, 5.594941571), (4.980961187, 5.93607839), (4.57896037, 6.251409676))
            ThreePointArc((4.57896037, 6.251409676), (5.088490721, 7.339459313), (5.211616414, 8.534579916))
            ThreePointArc((5.211616414, 8.534579916), (5, 8.660254038), (4.785354811, 8.780682168))
            ThreePointArc((4.785354811, 8.780682168), (3.811912855, 8.076491888), (3.124399404, 7.091200841))
            ThreePointArc((3.124399404, 7.091200841), (2.650314091, 7.281678118), (2.164707237, 7.440500224))
            ThreePointArc((2.164707237, 7.440500224), (2.271374255, 8.637202083), (1.978319241, 9.802359562))
            ThreePointArc((1.978319241, 9.802359562), (1.736481777, 9.84807753), (1.49359243, 9.887829977))
            ThreePointArc((1.49359243, 9.887829977), (0.819703468, 8.89317081), (0.510641536, 7.732156635))
            ThreePointArc((0.510641536, 7.732156635), (0, 7.749), (-0.510641536, 7.732156635))
            ThreePointArc((-0.510641536, 7.732156635), (-0.819703468, 8.89317081), (-1.49359243, 9.887829977))
            ThreePointArc((-1.49359243, 9.887829977), (-1.736481777, 9.84807753), (-1.978319241, 9.802359562))
            ThreePointArc((-1.978319241, 9.802359562), (-2.271374255, 8.637202083), (-2.164707237, 7.440500224))
            ThreePointArc((-2.164707237, 7.440500224), (-2.650314091, 7.281678118), (-3.124399404, 7.091200841))
            ThreePointArc((-3.124399404, 7.091200841), (-3.811912855, 8.076491888), (-4.785354811, 8.780682168))
            ThreePointArc((-4.785354811, 8.780682168), (-5, 8.660254038), (-5.211616414, 8.534579916))
            ThreePointArc((-5.211616414, 8.534579916), (-5.088490721, 7.339459313), (-4.57896037, 6.251409676))
            ThreePointArc((-4.57896037, 6.251409676), (-4.980961187, 5.93607839), (-5.361308592, 5.594941571))
            ThreePointArc((-5.361308592, 5.594941571), (-6.344349294, 6.285668848), (-7.499932777, 6.6144545))
            ThreePointArc((-7.499932777, 6.6144545), (-7.660444431, 6.427876097), (-7.816315733, 6.237403976))
        make_face()
        Circle(SKETCH9_R, mode=Mode.SUBTRACT)
    extrude(amount=BOSS_EXTRUDE1_DEPTH)


solid = part.part
